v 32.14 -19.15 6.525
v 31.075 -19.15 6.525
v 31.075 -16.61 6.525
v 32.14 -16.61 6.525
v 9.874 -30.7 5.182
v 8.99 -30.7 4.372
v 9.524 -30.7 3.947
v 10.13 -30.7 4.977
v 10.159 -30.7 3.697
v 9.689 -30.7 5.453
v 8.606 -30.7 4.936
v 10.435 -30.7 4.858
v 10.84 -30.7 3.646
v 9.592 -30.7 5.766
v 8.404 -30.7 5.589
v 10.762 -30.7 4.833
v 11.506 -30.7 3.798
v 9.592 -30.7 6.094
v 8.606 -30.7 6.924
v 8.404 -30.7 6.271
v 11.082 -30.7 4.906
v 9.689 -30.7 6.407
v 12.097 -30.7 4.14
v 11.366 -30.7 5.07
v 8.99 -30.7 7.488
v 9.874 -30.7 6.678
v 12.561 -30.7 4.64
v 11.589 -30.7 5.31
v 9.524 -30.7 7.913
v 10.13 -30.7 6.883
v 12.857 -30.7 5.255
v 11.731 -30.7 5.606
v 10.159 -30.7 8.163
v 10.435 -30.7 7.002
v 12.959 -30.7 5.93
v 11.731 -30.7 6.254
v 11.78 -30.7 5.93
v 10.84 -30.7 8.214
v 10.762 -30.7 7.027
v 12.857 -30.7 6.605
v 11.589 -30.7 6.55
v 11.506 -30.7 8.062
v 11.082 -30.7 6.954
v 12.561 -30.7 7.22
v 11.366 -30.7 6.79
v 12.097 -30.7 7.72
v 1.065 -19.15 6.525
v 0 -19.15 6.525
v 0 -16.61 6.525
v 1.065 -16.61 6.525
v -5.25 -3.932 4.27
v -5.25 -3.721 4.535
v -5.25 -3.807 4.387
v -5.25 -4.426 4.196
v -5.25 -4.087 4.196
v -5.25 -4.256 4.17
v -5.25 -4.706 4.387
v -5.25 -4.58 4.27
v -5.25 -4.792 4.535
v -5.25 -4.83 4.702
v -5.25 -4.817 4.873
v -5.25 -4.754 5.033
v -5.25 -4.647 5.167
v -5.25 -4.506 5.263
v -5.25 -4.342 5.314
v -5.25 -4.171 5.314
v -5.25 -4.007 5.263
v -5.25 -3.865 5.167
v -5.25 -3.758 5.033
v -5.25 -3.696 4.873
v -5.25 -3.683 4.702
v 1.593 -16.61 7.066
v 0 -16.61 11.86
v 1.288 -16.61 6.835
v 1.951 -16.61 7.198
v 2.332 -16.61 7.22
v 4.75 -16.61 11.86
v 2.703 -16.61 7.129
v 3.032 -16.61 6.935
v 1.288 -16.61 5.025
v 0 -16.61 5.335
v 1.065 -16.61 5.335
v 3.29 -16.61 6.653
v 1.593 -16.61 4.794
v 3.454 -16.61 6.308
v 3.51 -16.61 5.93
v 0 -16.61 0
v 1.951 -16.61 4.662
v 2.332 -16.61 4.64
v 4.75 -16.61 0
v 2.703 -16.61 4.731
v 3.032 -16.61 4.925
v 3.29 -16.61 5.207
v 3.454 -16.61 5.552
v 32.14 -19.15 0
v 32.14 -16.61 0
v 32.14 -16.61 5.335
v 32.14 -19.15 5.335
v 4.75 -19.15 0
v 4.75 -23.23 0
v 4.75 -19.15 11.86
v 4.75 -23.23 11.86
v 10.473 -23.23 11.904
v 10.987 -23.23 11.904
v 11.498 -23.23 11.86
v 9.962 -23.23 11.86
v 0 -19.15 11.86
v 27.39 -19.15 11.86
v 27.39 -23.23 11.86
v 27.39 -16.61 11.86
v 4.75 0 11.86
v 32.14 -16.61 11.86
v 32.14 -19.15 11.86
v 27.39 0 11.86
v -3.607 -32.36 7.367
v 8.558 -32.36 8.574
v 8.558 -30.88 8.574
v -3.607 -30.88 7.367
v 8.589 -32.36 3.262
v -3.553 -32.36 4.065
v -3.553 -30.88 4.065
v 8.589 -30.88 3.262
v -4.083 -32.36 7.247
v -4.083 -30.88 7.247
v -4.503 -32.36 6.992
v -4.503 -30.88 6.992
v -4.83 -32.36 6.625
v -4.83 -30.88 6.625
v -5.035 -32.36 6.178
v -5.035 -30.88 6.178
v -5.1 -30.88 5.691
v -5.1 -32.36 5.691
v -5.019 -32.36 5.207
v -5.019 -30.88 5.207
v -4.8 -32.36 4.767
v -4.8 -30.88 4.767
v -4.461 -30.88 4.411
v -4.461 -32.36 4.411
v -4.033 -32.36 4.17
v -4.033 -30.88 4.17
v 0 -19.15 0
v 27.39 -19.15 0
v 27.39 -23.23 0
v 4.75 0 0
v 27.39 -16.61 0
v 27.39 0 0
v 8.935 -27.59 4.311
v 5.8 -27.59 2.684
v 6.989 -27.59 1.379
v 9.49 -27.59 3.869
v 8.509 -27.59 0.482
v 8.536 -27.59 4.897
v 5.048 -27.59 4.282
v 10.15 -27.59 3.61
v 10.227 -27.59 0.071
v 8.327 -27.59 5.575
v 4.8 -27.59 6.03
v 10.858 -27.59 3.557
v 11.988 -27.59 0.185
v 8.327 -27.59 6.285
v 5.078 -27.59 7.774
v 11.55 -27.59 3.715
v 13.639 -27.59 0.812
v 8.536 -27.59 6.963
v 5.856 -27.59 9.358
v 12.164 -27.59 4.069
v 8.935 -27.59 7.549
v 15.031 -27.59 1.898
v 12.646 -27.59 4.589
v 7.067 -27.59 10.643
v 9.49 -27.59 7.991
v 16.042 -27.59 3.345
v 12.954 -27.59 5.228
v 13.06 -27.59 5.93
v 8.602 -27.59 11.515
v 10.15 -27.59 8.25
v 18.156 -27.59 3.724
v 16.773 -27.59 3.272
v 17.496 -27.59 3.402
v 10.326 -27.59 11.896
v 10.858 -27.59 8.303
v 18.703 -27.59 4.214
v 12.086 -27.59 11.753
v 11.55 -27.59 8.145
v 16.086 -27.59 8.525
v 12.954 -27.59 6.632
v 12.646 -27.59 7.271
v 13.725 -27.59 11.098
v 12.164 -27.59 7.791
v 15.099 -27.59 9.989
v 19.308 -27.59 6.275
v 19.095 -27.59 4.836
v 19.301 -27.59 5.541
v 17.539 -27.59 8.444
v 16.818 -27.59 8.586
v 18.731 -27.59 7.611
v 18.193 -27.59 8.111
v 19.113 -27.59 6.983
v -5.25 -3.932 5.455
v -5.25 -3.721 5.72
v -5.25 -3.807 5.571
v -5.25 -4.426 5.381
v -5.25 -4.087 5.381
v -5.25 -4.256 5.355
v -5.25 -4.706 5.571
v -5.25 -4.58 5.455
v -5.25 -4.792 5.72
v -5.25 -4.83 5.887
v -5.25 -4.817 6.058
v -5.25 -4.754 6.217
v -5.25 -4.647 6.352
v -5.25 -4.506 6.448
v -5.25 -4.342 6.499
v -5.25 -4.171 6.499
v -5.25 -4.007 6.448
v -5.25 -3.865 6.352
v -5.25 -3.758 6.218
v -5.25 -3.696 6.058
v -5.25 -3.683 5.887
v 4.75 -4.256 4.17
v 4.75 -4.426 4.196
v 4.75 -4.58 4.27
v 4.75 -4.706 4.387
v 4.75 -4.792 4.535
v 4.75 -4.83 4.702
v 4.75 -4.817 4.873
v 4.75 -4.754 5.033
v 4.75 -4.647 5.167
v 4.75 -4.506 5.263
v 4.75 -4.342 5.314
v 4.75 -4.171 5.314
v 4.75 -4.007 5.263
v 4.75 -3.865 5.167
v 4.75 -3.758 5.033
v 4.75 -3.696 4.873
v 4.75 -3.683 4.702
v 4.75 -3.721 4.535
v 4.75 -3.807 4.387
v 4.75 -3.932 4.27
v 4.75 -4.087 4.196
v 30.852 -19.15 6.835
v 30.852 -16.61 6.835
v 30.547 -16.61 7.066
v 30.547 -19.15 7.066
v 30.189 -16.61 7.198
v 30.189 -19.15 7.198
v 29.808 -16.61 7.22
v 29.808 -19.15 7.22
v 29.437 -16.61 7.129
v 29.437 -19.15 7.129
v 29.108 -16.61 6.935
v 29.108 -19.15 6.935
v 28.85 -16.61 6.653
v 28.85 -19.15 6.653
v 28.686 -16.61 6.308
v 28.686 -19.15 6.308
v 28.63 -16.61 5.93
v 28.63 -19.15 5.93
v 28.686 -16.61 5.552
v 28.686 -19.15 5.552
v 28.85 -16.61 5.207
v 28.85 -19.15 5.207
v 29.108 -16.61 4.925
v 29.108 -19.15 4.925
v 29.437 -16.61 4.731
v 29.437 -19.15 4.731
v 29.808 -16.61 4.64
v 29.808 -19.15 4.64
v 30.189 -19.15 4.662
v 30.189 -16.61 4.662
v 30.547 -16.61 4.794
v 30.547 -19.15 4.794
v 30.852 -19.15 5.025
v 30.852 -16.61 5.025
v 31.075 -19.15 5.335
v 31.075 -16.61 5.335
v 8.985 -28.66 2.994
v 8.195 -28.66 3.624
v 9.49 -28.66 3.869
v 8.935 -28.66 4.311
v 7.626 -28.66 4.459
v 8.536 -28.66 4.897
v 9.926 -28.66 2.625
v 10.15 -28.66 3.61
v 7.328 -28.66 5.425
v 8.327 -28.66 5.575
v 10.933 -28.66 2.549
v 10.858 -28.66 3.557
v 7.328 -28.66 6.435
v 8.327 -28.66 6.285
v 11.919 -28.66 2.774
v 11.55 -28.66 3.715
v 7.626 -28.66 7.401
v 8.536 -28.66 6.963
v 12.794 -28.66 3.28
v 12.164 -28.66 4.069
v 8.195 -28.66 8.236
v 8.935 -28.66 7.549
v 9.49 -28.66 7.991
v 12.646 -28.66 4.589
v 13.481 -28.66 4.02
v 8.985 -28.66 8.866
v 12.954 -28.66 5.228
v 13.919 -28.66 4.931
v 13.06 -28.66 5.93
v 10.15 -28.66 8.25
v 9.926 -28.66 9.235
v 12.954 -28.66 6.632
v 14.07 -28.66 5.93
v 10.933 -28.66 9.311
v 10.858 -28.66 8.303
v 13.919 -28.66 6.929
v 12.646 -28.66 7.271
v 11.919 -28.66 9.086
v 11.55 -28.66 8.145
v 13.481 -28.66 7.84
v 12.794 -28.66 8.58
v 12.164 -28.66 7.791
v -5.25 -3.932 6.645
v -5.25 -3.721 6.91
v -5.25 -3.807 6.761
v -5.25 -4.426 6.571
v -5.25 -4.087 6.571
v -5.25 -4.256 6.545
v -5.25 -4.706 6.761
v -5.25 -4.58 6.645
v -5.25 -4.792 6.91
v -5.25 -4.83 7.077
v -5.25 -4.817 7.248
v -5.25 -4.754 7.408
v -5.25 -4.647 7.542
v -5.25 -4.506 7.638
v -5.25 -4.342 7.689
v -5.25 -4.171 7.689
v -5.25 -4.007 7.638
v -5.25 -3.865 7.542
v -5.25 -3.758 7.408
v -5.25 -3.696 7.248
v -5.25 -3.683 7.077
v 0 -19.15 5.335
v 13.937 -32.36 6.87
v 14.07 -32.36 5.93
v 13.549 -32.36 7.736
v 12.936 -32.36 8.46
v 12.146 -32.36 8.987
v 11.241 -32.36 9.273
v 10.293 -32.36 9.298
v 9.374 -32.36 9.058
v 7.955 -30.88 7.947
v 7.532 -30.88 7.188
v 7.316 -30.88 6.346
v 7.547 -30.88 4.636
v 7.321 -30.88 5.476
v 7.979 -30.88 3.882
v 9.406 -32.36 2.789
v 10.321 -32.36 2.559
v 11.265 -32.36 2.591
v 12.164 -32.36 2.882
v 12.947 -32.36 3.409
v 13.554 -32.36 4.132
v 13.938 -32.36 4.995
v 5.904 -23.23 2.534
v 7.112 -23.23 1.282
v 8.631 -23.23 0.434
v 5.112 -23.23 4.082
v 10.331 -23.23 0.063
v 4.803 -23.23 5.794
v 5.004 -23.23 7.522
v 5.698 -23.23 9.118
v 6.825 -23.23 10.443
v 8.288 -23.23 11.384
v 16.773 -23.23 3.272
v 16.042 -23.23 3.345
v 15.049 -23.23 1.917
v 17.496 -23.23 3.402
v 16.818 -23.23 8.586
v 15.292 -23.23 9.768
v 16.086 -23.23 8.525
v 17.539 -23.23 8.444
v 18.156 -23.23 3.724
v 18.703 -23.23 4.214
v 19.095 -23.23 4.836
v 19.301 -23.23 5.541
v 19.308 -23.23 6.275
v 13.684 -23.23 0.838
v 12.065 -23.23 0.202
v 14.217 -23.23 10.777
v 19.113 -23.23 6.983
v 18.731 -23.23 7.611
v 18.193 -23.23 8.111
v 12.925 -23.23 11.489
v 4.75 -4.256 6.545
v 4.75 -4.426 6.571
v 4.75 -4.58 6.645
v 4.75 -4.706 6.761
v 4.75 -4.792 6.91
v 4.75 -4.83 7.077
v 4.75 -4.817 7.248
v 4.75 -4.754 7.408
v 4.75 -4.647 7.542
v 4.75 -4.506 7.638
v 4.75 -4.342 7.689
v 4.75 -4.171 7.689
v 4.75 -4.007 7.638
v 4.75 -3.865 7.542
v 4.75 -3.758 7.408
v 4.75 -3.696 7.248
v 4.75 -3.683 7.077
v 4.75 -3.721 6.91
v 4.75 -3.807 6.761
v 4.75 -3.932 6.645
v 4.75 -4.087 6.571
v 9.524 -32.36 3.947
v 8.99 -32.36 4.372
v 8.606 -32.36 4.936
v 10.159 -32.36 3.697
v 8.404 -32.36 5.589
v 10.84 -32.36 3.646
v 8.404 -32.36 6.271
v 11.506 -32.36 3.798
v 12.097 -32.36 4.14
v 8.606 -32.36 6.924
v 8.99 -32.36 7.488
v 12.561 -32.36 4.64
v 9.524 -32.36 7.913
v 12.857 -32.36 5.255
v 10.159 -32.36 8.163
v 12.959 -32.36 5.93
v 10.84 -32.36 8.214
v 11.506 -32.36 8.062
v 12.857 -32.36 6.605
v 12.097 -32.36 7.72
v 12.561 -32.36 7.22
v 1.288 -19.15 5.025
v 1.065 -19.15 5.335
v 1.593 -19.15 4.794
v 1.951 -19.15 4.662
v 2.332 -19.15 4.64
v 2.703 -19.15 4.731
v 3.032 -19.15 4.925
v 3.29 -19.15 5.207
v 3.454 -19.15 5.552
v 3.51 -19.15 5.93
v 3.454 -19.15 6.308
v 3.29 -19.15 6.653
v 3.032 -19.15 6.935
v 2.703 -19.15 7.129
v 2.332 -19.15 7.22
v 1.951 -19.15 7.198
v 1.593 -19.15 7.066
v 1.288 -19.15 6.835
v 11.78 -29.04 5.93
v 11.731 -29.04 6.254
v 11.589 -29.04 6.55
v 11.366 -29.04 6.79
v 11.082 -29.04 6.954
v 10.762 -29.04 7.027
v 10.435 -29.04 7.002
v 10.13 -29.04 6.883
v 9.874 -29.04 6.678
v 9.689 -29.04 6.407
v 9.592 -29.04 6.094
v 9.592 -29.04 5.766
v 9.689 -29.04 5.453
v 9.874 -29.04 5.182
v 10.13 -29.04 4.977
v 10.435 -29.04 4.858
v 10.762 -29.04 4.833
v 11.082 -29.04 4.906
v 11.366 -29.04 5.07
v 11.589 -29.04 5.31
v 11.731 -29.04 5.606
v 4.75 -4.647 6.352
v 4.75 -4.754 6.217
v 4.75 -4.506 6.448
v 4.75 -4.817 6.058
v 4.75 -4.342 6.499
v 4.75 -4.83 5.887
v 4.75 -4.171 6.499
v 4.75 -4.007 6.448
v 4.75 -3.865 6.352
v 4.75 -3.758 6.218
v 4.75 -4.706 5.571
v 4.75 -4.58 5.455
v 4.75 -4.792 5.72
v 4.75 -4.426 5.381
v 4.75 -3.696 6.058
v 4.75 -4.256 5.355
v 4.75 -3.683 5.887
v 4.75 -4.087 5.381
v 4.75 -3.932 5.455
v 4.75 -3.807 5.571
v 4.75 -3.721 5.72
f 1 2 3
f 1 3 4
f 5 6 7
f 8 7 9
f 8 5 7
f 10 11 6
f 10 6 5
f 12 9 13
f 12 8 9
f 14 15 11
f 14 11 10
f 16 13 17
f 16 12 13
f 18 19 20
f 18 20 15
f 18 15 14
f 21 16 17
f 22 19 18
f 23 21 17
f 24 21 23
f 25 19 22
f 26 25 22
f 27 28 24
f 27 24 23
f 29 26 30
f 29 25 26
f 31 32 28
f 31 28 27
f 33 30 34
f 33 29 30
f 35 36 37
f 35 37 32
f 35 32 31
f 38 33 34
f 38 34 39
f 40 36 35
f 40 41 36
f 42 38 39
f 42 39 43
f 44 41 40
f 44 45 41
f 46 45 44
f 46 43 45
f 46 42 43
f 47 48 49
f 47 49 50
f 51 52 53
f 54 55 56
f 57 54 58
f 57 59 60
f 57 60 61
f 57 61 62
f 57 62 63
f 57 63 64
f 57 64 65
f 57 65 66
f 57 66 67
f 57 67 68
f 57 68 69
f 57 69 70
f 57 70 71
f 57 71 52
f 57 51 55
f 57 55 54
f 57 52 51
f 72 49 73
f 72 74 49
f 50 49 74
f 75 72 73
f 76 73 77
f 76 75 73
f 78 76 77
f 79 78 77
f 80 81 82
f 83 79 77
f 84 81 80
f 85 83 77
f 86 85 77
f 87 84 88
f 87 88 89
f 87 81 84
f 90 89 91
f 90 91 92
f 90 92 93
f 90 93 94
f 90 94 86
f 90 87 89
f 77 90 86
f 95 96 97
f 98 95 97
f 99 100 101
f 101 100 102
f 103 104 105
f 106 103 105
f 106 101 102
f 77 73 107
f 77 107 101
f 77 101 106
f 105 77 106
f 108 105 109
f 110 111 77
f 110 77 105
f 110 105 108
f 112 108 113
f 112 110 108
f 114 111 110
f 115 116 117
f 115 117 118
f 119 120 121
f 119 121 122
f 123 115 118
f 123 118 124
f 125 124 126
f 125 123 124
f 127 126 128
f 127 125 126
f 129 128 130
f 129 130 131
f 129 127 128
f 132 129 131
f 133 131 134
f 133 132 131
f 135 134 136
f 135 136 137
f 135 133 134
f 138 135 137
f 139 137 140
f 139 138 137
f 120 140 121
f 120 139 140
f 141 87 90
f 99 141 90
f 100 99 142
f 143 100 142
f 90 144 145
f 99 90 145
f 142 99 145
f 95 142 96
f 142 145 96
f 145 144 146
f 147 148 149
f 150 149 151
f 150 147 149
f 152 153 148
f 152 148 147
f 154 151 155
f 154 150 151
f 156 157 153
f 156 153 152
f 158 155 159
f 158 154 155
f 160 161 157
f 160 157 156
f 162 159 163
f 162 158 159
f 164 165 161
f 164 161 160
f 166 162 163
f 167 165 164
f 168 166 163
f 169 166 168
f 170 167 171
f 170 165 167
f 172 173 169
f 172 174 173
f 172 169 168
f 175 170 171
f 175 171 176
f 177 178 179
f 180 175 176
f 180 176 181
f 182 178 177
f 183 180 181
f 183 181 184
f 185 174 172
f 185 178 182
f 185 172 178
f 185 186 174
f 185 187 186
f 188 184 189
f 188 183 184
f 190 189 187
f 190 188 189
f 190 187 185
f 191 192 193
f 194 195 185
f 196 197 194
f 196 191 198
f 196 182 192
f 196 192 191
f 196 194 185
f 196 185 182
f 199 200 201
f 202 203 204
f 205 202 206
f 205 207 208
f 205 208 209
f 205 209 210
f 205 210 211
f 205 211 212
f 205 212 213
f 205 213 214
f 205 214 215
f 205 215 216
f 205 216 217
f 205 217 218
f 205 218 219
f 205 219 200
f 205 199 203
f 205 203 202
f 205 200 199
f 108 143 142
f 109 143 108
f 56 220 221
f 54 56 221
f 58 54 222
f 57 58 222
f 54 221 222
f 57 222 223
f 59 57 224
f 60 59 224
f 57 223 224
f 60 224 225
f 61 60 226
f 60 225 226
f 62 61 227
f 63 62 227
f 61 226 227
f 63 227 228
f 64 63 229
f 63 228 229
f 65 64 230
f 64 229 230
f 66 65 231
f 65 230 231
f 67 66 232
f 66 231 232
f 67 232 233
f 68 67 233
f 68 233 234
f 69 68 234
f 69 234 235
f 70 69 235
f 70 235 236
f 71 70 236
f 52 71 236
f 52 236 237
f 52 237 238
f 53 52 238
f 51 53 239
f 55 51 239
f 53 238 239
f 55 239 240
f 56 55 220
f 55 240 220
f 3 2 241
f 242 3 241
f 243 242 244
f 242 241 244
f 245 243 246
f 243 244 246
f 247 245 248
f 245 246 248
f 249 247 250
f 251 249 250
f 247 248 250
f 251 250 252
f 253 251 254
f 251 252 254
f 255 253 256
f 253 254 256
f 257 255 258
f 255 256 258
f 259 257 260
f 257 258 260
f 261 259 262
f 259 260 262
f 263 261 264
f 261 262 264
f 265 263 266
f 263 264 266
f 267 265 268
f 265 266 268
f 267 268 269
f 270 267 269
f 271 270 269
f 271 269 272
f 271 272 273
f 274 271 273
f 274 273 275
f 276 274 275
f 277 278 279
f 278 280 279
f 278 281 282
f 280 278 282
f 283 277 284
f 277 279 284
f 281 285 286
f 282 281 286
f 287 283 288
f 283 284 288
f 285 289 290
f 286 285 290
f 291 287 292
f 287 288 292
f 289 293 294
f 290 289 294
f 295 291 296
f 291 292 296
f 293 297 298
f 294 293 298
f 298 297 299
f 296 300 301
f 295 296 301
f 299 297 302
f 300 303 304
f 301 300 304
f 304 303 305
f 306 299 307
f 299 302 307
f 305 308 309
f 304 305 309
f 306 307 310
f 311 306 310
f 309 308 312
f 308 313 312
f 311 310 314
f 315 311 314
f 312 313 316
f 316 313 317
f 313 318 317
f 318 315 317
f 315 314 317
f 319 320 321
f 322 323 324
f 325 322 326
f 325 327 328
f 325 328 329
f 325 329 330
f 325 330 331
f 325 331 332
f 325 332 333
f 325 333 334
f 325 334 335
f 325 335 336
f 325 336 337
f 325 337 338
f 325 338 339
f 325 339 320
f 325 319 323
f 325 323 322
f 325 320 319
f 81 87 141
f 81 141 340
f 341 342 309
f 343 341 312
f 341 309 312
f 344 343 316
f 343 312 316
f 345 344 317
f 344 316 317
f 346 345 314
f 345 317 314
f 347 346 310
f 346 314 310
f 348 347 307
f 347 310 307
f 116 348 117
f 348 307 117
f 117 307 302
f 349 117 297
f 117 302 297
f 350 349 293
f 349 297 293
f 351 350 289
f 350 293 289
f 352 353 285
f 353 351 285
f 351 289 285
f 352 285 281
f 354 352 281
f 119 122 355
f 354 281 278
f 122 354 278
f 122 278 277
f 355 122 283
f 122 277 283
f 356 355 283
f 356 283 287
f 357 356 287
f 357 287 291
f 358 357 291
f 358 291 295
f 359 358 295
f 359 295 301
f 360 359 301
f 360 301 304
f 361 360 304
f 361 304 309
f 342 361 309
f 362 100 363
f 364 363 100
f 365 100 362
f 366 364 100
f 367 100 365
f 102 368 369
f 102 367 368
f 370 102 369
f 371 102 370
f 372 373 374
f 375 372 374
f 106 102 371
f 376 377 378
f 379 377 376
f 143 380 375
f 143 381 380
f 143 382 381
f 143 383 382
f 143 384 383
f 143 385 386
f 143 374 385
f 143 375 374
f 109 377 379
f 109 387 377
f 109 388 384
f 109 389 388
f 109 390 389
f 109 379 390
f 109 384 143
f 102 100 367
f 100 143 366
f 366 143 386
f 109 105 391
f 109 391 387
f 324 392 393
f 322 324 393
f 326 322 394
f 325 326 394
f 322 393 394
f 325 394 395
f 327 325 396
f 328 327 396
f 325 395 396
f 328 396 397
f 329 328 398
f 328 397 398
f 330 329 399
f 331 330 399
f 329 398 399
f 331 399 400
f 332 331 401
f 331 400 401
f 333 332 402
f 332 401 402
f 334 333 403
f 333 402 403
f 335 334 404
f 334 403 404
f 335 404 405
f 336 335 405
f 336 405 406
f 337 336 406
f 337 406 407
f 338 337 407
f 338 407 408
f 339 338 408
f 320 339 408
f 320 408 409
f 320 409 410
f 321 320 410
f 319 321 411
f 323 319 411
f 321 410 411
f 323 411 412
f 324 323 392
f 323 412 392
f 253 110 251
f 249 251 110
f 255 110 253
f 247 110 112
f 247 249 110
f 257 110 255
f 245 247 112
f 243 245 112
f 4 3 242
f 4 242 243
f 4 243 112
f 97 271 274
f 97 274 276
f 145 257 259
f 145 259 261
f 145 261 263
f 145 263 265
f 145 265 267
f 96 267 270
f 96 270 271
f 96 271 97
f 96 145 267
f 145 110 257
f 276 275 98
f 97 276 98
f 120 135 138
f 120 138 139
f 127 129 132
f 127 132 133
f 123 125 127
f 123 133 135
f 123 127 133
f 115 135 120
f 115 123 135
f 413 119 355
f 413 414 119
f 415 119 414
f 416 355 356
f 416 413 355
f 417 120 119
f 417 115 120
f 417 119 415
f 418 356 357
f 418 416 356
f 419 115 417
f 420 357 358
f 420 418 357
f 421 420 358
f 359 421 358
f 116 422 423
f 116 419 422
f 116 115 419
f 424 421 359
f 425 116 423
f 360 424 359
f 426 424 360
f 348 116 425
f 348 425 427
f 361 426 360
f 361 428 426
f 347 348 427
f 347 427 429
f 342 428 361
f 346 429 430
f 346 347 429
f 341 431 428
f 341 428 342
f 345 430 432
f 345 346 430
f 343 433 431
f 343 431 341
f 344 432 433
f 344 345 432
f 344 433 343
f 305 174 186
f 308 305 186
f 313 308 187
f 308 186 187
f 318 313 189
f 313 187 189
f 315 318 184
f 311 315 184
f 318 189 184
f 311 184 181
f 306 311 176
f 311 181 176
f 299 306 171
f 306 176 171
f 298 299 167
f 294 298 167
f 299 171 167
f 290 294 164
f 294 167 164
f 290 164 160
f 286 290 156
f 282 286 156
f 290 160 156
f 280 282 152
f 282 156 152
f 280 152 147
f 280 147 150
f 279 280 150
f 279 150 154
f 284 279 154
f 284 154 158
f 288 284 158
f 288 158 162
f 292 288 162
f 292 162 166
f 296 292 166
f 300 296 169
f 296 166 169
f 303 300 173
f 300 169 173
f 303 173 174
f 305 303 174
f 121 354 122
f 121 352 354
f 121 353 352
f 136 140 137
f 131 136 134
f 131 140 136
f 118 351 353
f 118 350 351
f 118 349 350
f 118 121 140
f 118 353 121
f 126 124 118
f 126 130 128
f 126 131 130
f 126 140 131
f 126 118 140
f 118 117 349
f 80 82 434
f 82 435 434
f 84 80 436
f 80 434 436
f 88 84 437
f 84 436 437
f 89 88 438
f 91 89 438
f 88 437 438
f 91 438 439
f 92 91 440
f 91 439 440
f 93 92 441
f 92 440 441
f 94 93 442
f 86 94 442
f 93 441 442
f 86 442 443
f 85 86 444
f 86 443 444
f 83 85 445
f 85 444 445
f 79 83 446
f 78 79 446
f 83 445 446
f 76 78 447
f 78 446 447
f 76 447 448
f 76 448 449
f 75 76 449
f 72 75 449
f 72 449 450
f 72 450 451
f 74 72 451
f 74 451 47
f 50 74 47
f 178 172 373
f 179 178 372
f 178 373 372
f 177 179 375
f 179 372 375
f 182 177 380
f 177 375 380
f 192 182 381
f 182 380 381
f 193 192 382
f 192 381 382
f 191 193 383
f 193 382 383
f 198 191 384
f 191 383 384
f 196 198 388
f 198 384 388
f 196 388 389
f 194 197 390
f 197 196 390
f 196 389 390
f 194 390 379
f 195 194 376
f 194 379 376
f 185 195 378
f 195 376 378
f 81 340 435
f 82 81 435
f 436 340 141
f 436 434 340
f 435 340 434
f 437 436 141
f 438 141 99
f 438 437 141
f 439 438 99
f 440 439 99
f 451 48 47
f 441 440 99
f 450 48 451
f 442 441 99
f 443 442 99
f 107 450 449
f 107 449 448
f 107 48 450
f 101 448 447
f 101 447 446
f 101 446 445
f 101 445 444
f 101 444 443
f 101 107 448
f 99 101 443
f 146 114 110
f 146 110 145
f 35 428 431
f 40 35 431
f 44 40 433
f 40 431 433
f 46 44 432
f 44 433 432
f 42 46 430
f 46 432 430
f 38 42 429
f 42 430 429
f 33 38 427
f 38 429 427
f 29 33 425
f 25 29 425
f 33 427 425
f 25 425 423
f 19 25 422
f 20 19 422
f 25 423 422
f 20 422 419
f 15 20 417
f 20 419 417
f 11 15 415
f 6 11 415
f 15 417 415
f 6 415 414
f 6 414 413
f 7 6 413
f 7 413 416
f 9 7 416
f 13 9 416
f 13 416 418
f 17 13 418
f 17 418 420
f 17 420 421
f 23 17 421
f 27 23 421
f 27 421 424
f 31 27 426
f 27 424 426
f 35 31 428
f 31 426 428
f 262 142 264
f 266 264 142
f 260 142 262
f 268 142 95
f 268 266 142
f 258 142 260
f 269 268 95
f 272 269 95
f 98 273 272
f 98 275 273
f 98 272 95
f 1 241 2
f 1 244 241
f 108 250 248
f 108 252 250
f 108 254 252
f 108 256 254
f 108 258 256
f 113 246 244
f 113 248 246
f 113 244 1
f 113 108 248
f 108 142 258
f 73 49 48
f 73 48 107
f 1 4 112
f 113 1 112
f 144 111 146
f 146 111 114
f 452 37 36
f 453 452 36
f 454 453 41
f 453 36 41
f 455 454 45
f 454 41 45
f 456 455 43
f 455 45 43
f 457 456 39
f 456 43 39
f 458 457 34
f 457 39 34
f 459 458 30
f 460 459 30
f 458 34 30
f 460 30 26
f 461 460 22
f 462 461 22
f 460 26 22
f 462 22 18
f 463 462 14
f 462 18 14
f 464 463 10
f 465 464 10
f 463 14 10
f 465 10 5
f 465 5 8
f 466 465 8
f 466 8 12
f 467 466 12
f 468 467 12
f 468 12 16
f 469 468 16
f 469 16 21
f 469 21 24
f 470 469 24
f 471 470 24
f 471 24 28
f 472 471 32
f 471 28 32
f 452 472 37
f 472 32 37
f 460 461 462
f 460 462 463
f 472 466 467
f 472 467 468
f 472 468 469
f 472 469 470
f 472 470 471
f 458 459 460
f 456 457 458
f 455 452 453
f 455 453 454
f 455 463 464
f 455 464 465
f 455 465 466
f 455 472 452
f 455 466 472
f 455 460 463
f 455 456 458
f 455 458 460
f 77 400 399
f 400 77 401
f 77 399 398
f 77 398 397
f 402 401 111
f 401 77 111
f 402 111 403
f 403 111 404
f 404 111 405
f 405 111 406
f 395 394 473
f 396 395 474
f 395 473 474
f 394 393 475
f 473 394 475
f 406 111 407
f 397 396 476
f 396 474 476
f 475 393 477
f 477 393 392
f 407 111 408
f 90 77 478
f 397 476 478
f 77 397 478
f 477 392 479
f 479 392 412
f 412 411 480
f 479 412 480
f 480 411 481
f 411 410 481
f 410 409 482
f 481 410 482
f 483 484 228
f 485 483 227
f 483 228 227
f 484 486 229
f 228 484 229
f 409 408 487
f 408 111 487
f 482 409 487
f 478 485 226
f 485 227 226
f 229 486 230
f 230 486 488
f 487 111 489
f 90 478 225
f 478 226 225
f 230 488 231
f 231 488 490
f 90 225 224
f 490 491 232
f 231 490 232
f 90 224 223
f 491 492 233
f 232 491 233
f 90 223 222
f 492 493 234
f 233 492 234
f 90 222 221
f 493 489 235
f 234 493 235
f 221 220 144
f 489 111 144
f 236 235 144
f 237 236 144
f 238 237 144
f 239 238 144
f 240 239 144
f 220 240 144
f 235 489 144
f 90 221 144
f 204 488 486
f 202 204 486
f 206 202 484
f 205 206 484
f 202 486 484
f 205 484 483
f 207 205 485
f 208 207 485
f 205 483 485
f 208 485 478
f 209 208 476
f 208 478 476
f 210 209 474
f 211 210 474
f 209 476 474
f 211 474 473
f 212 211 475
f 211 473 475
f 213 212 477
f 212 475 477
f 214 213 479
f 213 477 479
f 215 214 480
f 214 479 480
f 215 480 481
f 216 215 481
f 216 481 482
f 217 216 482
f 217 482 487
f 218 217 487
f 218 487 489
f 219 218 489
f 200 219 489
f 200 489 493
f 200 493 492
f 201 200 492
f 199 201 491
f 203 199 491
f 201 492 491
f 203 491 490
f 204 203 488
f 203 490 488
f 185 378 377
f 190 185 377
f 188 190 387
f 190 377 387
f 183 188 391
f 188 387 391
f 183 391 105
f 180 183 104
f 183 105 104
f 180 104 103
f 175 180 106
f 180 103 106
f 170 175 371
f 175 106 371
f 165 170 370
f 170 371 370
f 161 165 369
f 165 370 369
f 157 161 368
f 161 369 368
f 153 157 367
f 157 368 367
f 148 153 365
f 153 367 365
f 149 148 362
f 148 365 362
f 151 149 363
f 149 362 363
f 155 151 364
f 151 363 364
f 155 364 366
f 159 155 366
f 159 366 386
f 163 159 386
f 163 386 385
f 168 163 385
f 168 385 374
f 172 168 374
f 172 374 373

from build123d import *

# Parameters (mm, degrees)
SKETCH001_W     = 32.14
SKETCH001_H     = 11.86
PAD_DEPTH       = 27.59
SKETCH002_W     = 4.75
SKETCH002_H     = 11.86
POCKET_DEPTH    = 8.44
SKETCH_W        = 4.75
SKETCH_H        = 11.86
POCKET001_DEPTH = 16.61
SKETCH003_W     = 8.06
SKETCH003_H     = 11.86
POCKET002_DEPTH = 4.36
SKETCH004_R     = 1.295
POCKET003_DEPTH = 2.54
SKETCH005_R     = 1.295
POCKET004_DEPTH = 2.54
SKETCH007_W     = 1.066805
SKETCH007_H     = 1.19
POCKET005_DEPTH = 2.54
SKETCH008_W     = 1.5
SKETCH008_H     = 1.19
POCKET006_DEPTH = 2.54
SKETCH011_W     = 14.58
SKETCH011_H     = 11.86
POCKET007_DEPTH = 4.36
SKETCH012_R     = 5.93
PAD001_DEPTH    = 4.36
SKETCH013_R     = 2.66
PAD002_DEPTH    = 4.36
SKETCH014_R     = 2.38
PAD003_DEPTH    = 1.07
SKETCH015_R     = 3.39
PAD004_DEPTH    = 3.7
PAD005_DEPTH    = 1.48
SKETCH017_R     = 2.29
POCKET008_DEPTH = 1.66
SKETCH018_R     = 1.1
POCKET009_DEPTH = 1.66
SKETCH019_R     = 0.575
PAD006_DEPTH    = 10


with BuildPart() as part:
    # Sketch001 → Pad (new body)
    with BuildSketch(Plane.XZ):
        with Locations((16.07, 5.93)):
            Rectangle(SKETCH001_W, SKETCH001_H)
    extrude(amount=PAD_DEPTH)

    # Sketch002 (on Face6 of Pad) → Pocket (cut)
    with BuildSketch(Plane.XZ.offset(27.59)):
        with Locations((2.375, 5.93)):
            Rectangle(SKETCH002_W, SKETCH002_H)
        with Locations((29.765, 5.93)):
            Rectangle(SKETCH002_W, SKETCH002_H)
    extrude(amount=-POCKET_DEPTH, mode=Mode.SUBTRACT)

    # Sketch (on Face2 of Pocket) → Pocket001 (cut)
    with BuildSketch(Plane(origin=(0, 0, 0), x_dir=(1, 0, 0), z_dir=(0, 1, 0))):
        with Locations((2.375, -5.93)):
            Rectangle(SKETCH_W, SKETCH_H)
        with Locations((29.765, -5.93)):
            Rectangle(SKETCH_W, SKETCH_H)
    extrude(amount=-POCKET001_DEPTH, mode=Mode.SUBTRACT)

    # Sketch003 (on Face8 of Pocket001) → Pocket002 (cut)
    with BuildSketch(Plane.XZ.offset(27.59)):
        with Locations((23.36, 5.93)):
            Rectangle(SKETCH003_W, SKETCH003_H)
    extrude(amount=-POCKET002_DEPTH, mode=Mode.SUBTRACT)

    # Sketch004 (on Face6 of Pocket002) → Pocket003 (cut)
    with BuildSketch(Plane.XZ.offset(19.15)):
        with Locations((29.925, 5.93)):
            Circle(SKETCH004_R)
    extrude(amount=-POCKET003_DEPTH, mode=Mode.SUBTRACT)

    # Sketch005 (on Face12 of Pocket003) → Pocket004 (cut)
    with BuildSketch(Plane.XZ.offset(19.15)):
        with Locations((2.215, 5.93)):
            Circle(SKETCH005_R)
    extrude(amount=-POCKET004_DEPTH, mode=Mode.SUBTRACT)

    # Sketch007 (on Face6 of Pocket004) → Pocket005 (cut)
    with BuildSketch(Plane.XZ.offset(19.15)):
        with Locations((31.6065975, 5.93)):
            Rectangle(SKETCH007_W, SKETCH007_H)
    extrude(amount=-POCKET005_DEPTH, mode=Mode.SUBTRACT)

    # Sketch008 (on Face12 of Pocket005) → Pocket006 (cut)
    with BuildSketch(Plane.XZ.offset(19.15)):
        with Locations((0.75, 5.93)):
            Rectangle(SKETCH008_W, SKETCH008_H)
    extrude(amount=-POCKET006_DEPTH, mode=Mode.SUBTRACT)

    # Sketch011 (on Face10 of Pocket006) → Pocket007 (cut)
    with BuildSketch(Plane.XZ.offset(27.59)):
        with Locations((12.04, 5.93)):
            Rectangle(SKETCH011_W, SKETCH011_H)
    extrude(amount=-POCKET007_DEPTH, mode=Mode.SUBTRACT)

    # Sketch012 (on Face9 of Pocket007) → Pad001 (join)
    with BuildSketch(Plane.XZ.offset(23.23)):
        with Locations((10.73, 5.98)):
            Circle(SKETCH012_R)
    extrude(amount=PAD001_DEPTH)

    # Sketch013 (on Face9 of Pad001) → Pad002 (join)
    with BuildSketch(Plane.XZ.offset(23.23)):
        with Locations((16.67, 5.93)):
            Circle(SKETCH013_R)
    extrude(amount=PAD002_DEPTH)

    # Sketch014 (on Face24 of Pad002) → Pad003 (join)
    with BuildSketch(Plane.XZ.offset(27.59)):
        with Locations((10.68, 5.93)):
            Circle(SKETCH014_R)
    extrude(amount=PAD003_DEPTH)

    # Sketch015 (on Face28 of Pad003) → Pad004 (join)
    with BuildSketch(Plane.XZ.offset(28.66)):
        with Locations((10.68, 5.93)):
            Circle(SKETCH015_R)
    extrude(amount=PAD004_DEPTH)

    # Sketch016 (on Face3 of Pad004) → Pad005 (join)
    with BuildSketch(Plane.XZ.offset(32.36)):
        with BuildLine():
            Line((8.62, 8.58), (8.62, 3.26))
            Line((-3.5526338926, 4.0654001014), (8.62, 3.26))
            ThreePointArc((-3.6067901761, 7.3671849678), (-5.0997771882, 5.691360238), (-3.5526338926, 4.0654001014))
            Line((8.62, 8.58), (-3.6067901761, 7.3671849678))
        make_face()
    extrude(amount=-PAD005_DEPTH)

    # Sketch017 (on Face34 of Pad005) → Pocket008 (cut)
    with BuildSketch(Plane.XZ.offset(32.36)):
        with Locations((10.668875, 5.93)):
            Circle(SKETCH017_R)
    extrude(amount=-POCKET008_DEPTH, mode=Mode.SUBTRACT)

    # Sketch018 (on Face11 of Pocket008) → Pocket009 (cut)
    with BuildSketch(Plane.XZ.offset(30.7)):
        with Locations((10.68, 5.93)):
            Circle(SKETCH018_R)
    extrude(amount=-POCKET009_DEPTH, mode=Mode.SUBTRACT)

    # Sketch019 (on Face23 of Pocket009) → Pad006 (join)
    with BuildSketch(Plane(origin=(4.75, 0, 0), x_dir=(0, 0, -1), z_dir=(-1, 0, 0))):
        with Locations((-5.93, 4.256319)):
            Circle(SKETCH019_R)
        with Locations((-7.12, 4.256319)):
            Circle(SKETCH019_R)
        with Locations((-4.745135, 4.256319)):
            Circle(SKETCH019_R)
    extrude(amount=PAD006_DEPTH)


solid = part.part
